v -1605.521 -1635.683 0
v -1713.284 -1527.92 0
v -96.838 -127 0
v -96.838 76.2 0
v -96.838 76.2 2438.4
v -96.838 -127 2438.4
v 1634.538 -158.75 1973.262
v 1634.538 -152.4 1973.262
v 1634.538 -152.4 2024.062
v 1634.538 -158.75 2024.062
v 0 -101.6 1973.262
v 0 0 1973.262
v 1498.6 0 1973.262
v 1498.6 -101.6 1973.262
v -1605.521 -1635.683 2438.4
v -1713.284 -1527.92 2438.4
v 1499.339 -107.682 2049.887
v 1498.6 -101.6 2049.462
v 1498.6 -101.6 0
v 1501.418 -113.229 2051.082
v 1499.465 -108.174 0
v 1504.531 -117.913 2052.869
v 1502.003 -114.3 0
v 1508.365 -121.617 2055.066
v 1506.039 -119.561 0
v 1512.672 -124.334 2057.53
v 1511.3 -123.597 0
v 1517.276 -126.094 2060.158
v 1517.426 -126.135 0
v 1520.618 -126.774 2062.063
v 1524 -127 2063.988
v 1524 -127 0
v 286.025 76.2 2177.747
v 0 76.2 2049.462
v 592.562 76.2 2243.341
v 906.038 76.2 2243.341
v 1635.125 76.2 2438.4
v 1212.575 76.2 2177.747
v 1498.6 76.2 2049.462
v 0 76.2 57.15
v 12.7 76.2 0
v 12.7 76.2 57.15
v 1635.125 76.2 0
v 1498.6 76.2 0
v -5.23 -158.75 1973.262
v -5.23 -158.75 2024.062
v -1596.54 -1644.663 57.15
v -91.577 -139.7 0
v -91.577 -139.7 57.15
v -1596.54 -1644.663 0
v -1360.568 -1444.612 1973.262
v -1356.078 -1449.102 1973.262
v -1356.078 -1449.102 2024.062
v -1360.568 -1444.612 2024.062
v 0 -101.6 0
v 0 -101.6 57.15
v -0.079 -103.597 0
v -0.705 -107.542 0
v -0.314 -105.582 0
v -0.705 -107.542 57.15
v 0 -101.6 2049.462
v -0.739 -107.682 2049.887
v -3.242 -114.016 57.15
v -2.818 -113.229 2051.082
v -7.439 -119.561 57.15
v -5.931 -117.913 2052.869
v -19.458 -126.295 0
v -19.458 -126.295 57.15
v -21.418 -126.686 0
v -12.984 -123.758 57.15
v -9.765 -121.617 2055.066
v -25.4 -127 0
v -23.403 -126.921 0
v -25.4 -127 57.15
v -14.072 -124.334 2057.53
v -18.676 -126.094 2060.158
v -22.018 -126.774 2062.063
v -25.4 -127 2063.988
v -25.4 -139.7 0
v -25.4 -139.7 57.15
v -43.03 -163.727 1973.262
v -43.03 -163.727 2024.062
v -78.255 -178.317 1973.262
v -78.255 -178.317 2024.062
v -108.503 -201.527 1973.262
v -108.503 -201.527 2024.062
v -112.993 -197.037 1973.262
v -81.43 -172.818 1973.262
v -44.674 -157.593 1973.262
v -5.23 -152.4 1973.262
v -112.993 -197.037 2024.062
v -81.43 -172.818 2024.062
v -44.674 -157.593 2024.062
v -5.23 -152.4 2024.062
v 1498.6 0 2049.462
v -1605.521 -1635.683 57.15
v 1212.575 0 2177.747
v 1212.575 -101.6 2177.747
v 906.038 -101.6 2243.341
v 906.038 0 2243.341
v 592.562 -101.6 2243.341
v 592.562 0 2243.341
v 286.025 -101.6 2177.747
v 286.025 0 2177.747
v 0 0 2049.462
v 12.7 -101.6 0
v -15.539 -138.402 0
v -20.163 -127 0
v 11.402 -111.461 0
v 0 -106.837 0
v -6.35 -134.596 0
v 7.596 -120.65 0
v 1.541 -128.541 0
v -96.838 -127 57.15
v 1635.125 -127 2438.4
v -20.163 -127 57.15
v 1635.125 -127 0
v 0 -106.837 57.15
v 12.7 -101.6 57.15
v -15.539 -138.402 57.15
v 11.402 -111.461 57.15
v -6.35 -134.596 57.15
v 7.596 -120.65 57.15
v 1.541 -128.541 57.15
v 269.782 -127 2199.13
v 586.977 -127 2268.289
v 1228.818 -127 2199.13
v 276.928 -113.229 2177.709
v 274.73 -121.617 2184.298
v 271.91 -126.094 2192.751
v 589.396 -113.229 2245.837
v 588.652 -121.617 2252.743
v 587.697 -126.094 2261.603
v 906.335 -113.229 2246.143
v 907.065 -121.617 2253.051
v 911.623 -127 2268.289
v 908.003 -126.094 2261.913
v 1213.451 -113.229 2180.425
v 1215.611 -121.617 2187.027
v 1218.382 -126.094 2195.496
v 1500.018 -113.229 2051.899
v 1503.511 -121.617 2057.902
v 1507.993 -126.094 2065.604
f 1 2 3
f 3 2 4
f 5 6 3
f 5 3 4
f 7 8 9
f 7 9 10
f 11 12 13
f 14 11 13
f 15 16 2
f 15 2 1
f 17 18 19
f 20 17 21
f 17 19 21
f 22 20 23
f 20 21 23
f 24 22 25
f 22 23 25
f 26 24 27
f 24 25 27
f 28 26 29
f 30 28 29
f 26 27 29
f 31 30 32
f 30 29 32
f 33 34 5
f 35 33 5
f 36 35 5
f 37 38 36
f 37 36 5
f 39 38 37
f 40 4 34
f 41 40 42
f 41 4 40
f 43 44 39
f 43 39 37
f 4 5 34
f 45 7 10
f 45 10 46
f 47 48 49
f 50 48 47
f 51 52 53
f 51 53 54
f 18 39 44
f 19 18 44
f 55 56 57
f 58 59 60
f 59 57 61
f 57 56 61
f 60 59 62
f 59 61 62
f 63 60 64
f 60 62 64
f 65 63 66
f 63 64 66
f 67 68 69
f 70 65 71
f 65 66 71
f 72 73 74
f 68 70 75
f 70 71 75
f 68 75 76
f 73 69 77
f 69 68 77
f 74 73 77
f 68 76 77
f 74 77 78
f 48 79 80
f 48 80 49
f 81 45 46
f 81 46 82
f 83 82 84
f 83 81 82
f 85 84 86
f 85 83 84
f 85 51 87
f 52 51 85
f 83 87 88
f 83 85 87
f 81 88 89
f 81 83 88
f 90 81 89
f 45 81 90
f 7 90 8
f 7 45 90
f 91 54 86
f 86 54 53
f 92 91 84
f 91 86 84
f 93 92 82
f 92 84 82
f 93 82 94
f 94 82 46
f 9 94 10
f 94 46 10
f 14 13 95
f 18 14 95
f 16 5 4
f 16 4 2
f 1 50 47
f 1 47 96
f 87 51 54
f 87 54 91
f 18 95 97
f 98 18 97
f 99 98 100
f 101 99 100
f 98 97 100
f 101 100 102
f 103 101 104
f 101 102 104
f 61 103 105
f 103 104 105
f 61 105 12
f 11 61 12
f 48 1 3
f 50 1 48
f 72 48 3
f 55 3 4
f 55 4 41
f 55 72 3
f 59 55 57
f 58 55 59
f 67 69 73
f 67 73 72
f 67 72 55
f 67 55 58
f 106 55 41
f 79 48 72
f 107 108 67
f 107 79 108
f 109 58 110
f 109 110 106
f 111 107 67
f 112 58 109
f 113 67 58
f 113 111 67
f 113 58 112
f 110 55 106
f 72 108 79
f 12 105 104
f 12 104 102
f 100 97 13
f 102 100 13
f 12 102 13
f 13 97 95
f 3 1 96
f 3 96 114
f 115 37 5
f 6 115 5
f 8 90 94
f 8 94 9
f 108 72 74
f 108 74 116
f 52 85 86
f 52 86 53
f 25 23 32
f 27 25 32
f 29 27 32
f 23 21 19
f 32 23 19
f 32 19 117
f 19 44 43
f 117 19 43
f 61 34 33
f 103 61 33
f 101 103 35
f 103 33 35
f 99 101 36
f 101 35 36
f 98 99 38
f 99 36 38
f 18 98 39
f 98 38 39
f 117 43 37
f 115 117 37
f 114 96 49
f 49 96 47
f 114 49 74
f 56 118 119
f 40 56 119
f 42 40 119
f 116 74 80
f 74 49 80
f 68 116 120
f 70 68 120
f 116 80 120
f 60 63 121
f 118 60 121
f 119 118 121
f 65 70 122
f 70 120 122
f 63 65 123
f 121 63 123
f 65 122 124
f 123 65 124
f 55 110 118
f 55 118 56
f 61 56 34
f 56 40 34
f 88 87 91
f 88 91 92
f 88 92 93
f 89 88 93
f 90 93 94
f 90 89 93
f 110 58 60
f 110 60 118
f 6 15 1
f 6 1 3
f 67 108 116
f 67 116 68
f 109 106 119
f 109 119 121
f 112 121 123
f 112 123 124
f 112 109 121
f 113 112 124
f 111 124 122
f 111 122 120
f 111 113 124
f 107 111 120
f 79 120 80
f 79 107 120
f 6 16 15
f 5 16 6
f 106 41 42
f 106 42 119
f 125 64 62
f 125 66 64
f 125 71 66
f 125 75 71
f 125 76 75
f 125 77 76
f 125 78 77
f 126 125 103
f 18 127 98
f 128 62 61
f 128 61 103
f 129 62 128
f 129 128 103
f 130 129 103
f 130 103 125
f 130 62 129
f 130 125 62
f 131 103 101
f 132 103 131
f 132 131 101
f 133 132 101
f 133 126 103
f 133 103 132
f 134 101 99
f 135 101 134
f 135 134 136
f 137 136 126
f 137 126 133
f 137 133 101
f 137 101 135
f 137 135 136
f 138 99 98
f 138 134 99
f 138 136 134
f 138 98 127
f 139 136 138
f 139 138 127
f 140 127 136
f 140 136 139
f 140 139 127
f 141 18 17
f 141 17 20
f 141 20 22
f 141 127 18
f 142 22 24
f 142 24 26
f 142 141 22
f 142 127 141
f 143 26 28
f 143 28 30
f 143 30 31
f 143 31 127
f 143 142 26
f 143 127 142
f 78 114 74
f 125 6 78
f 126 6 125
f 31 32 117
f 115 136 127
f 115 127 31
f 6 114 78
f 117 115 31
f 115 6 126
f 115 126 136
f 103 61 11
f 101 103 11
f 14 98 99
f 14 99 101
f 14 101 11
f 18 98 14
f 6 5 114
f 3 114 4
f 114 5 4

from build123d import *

# Parameters (mm, degrees)
F1_DEPTH  = 101.6
F3_DEPTH  = 177.8
F5_DEPTH  = 25.4
F6_R      = 25.39999
F8_DEPTH  = 2438.4
F10_DEPTH = 57.15
F12_DEPTH = 50.8


# Not quite as in the source:
# - a fillet or chamfer is up to 0.001 mm smaller than in the source, because OpenCascade refuses the exact size
# - ends of sketch curves that miss each other by under 0.0002 mm in the source are joined


with BuildPart() as f1:
    # F0 (on Front) → F1 (new body)
    with BuildSketch(Plane.XZ):
        with BuildLine():
            Line((0, 2049.4625), (0, 1973.2625))
            Line((0, 1973.2625), (1498.6, 1973.2625))
            Line((1498.6, 1973.2625), (1498.6, 2049.4625))
            ThreePointArc((1498.6, 2049.4625), (749.3, 2251.6085390205), (0, 2049.4625))
        make_face()
    extrude(amount=F1_DEPTH)


with BuildPart() as f3:
    # F2 (on face) → F3 (new body)
    with BuildSketch(Plane.XZ.offset(101.6)):
        with BuildLine():
            Line((-96.8375, 0), (0, 0))
            Line((0, 0), (0, 1973.2625))
            Line((0, 1973.2625), (0, 2049.4625))
            ThreePointArc((0, 2049.4625), (749.3, 2251.6085390205), (1498.6, 2049.4625))
            Line((1498.6, 2049.4625), (1498.6, 1973.2625))
            Line((1498.6, 1973.2625), (1498.6, 0))
            Line((1498.6, 0), (1635.125, 0))
            Line((1635.125, 0), (1635.125, 2438.4))
            Line((1635.125, 2438.4), (-96.8375, 2438.4))
            Line((-96.8375, 2438.4), (-96.8375, 0))
        make_face()
    extrude(amount=-F3_DEPTH)

    # F4 (on face) → F5 (join)
    with BuildSketch(Plane.XZ.offset(101.6)):
        with BuildLine():
            Line((-96.8375, 2438.4), (-96.8375, 0))
            Line((-96.8375, 0), (0, 0))
            Line((0, 0), (0, 2049.4625))
            ThreePointArc((0, 2049.4625), (749.3, 2251.6085390205), (1498.6, 2049.4625))
            Line((1498.6, 2049.4625), (1498.6, 0))
            Line((1498.6, 0), (1635.125, 0))
            Line((1635.125, 0), (1635.125, 2438.4))
            Line((1635.125, 2438.4), (-96.8375, 2438.4))
        make_face()
    extrude(amount=F5_DEPTH)

    # F6 (radius 25.4 in the source; OpenCascade refuses exactly that, so slightly less here)
    f6_edges = [f3.edges().sort_by_distance(p)[0] for p in [
        (749.3, -127, 2251.608539),
        (1498.6, -127, 1024.73125),
        (0, -127, 1024.73125),
    ]]
    fillet(f6_edges, radius=F6_R)

    # F9 (on face) → F10 (join)
    with BuildSketch(Plane(origin=(0, 0, 0), x_dir=(1, 0, 0), z_dir=(0, 0, -1))):
        with BuildLine():
            Line((-25.4, 139.7), (-91.5769877579, 139.7))
            Line((-91.5769877579, 139.7), (-1596.5402722185, 1644.6632844607))
            Line((-1596.5402722185, 1644.6632844607), (-1605.5205283396, 1635.6830283396))
            Line((-1605.5205283396, 1635.6830283396), (-96.8375, 127))
            Line((-96.8375, 127), (-20.162967965, 127))
            Line((-20.162967965, 127), (0, 106.837032035))
            Line((0, 106.837032035), (0, -76.2))
            Line((0, -76.2), (12.7, -76.2))
            Line((12.7, -76.2), (12.7, 101.6))
            ThreePointArc((12.7, 101.6), (1.5407683632, 128.5407683632), (-25.4, 139.7))
        make_face()
    extrude(amount=-F10_DEPTH)


with BuildPart() as f8:
    # F7 (on face) → F8 (new body)
    with BuildSketch(Plane.XY.offset(2438.4)):
        Polygon((-1605.5205283396, -1635.6830283396), (-96.8375, -127), (-96.8375, 76.2), (-1713.2836017924, -1527.9199548868), align=None)
    extrude(amount=-F8_DEPTH)


with BuildPart() as f12:
    # F11 (on face) → F12 (new body)
    with BuildSketch(Plane(origin=(0, 0, 1973.2625), x_dir=(1, 0, 0), z_dir=(0, 0, -1))):
        with BuildLine():
            Line((-5.2298163679, 152.4), (1634.5378160477, 152.4))
            Line((1634.5378160477, 152.4), (1634.5378160477, 158.75))
            Line((1634.5378160477, 158.75), (-5.2298163679, 158.75))
            ThreePointArc((-5.2298163679, 158.75), (-61.1207328497, 169.8673914162), (-108.5027639496, 201.5270524183))
            Line((-108.5027639496, 201.5270524183), (-1356.0780931848, 1449.1023860323))
            Line((-1356.0780931848, 1449.1023860323), (-1360.5682212453, 1444.6122579717))
            Line((-1360.5682212453, 1444.6122579717), (-112.9928898208, 197.0369265472))
            ThreePointArc((-112.9928898208, 197.0369265472), (-63.5507714604, 164.0007592453), (-5.2298163679, 152.4))
        make_face()
    extrude(amount=-F12_DEPTH)


solid = Compound([f1.part, f3.part, f8.part, f12.part])
